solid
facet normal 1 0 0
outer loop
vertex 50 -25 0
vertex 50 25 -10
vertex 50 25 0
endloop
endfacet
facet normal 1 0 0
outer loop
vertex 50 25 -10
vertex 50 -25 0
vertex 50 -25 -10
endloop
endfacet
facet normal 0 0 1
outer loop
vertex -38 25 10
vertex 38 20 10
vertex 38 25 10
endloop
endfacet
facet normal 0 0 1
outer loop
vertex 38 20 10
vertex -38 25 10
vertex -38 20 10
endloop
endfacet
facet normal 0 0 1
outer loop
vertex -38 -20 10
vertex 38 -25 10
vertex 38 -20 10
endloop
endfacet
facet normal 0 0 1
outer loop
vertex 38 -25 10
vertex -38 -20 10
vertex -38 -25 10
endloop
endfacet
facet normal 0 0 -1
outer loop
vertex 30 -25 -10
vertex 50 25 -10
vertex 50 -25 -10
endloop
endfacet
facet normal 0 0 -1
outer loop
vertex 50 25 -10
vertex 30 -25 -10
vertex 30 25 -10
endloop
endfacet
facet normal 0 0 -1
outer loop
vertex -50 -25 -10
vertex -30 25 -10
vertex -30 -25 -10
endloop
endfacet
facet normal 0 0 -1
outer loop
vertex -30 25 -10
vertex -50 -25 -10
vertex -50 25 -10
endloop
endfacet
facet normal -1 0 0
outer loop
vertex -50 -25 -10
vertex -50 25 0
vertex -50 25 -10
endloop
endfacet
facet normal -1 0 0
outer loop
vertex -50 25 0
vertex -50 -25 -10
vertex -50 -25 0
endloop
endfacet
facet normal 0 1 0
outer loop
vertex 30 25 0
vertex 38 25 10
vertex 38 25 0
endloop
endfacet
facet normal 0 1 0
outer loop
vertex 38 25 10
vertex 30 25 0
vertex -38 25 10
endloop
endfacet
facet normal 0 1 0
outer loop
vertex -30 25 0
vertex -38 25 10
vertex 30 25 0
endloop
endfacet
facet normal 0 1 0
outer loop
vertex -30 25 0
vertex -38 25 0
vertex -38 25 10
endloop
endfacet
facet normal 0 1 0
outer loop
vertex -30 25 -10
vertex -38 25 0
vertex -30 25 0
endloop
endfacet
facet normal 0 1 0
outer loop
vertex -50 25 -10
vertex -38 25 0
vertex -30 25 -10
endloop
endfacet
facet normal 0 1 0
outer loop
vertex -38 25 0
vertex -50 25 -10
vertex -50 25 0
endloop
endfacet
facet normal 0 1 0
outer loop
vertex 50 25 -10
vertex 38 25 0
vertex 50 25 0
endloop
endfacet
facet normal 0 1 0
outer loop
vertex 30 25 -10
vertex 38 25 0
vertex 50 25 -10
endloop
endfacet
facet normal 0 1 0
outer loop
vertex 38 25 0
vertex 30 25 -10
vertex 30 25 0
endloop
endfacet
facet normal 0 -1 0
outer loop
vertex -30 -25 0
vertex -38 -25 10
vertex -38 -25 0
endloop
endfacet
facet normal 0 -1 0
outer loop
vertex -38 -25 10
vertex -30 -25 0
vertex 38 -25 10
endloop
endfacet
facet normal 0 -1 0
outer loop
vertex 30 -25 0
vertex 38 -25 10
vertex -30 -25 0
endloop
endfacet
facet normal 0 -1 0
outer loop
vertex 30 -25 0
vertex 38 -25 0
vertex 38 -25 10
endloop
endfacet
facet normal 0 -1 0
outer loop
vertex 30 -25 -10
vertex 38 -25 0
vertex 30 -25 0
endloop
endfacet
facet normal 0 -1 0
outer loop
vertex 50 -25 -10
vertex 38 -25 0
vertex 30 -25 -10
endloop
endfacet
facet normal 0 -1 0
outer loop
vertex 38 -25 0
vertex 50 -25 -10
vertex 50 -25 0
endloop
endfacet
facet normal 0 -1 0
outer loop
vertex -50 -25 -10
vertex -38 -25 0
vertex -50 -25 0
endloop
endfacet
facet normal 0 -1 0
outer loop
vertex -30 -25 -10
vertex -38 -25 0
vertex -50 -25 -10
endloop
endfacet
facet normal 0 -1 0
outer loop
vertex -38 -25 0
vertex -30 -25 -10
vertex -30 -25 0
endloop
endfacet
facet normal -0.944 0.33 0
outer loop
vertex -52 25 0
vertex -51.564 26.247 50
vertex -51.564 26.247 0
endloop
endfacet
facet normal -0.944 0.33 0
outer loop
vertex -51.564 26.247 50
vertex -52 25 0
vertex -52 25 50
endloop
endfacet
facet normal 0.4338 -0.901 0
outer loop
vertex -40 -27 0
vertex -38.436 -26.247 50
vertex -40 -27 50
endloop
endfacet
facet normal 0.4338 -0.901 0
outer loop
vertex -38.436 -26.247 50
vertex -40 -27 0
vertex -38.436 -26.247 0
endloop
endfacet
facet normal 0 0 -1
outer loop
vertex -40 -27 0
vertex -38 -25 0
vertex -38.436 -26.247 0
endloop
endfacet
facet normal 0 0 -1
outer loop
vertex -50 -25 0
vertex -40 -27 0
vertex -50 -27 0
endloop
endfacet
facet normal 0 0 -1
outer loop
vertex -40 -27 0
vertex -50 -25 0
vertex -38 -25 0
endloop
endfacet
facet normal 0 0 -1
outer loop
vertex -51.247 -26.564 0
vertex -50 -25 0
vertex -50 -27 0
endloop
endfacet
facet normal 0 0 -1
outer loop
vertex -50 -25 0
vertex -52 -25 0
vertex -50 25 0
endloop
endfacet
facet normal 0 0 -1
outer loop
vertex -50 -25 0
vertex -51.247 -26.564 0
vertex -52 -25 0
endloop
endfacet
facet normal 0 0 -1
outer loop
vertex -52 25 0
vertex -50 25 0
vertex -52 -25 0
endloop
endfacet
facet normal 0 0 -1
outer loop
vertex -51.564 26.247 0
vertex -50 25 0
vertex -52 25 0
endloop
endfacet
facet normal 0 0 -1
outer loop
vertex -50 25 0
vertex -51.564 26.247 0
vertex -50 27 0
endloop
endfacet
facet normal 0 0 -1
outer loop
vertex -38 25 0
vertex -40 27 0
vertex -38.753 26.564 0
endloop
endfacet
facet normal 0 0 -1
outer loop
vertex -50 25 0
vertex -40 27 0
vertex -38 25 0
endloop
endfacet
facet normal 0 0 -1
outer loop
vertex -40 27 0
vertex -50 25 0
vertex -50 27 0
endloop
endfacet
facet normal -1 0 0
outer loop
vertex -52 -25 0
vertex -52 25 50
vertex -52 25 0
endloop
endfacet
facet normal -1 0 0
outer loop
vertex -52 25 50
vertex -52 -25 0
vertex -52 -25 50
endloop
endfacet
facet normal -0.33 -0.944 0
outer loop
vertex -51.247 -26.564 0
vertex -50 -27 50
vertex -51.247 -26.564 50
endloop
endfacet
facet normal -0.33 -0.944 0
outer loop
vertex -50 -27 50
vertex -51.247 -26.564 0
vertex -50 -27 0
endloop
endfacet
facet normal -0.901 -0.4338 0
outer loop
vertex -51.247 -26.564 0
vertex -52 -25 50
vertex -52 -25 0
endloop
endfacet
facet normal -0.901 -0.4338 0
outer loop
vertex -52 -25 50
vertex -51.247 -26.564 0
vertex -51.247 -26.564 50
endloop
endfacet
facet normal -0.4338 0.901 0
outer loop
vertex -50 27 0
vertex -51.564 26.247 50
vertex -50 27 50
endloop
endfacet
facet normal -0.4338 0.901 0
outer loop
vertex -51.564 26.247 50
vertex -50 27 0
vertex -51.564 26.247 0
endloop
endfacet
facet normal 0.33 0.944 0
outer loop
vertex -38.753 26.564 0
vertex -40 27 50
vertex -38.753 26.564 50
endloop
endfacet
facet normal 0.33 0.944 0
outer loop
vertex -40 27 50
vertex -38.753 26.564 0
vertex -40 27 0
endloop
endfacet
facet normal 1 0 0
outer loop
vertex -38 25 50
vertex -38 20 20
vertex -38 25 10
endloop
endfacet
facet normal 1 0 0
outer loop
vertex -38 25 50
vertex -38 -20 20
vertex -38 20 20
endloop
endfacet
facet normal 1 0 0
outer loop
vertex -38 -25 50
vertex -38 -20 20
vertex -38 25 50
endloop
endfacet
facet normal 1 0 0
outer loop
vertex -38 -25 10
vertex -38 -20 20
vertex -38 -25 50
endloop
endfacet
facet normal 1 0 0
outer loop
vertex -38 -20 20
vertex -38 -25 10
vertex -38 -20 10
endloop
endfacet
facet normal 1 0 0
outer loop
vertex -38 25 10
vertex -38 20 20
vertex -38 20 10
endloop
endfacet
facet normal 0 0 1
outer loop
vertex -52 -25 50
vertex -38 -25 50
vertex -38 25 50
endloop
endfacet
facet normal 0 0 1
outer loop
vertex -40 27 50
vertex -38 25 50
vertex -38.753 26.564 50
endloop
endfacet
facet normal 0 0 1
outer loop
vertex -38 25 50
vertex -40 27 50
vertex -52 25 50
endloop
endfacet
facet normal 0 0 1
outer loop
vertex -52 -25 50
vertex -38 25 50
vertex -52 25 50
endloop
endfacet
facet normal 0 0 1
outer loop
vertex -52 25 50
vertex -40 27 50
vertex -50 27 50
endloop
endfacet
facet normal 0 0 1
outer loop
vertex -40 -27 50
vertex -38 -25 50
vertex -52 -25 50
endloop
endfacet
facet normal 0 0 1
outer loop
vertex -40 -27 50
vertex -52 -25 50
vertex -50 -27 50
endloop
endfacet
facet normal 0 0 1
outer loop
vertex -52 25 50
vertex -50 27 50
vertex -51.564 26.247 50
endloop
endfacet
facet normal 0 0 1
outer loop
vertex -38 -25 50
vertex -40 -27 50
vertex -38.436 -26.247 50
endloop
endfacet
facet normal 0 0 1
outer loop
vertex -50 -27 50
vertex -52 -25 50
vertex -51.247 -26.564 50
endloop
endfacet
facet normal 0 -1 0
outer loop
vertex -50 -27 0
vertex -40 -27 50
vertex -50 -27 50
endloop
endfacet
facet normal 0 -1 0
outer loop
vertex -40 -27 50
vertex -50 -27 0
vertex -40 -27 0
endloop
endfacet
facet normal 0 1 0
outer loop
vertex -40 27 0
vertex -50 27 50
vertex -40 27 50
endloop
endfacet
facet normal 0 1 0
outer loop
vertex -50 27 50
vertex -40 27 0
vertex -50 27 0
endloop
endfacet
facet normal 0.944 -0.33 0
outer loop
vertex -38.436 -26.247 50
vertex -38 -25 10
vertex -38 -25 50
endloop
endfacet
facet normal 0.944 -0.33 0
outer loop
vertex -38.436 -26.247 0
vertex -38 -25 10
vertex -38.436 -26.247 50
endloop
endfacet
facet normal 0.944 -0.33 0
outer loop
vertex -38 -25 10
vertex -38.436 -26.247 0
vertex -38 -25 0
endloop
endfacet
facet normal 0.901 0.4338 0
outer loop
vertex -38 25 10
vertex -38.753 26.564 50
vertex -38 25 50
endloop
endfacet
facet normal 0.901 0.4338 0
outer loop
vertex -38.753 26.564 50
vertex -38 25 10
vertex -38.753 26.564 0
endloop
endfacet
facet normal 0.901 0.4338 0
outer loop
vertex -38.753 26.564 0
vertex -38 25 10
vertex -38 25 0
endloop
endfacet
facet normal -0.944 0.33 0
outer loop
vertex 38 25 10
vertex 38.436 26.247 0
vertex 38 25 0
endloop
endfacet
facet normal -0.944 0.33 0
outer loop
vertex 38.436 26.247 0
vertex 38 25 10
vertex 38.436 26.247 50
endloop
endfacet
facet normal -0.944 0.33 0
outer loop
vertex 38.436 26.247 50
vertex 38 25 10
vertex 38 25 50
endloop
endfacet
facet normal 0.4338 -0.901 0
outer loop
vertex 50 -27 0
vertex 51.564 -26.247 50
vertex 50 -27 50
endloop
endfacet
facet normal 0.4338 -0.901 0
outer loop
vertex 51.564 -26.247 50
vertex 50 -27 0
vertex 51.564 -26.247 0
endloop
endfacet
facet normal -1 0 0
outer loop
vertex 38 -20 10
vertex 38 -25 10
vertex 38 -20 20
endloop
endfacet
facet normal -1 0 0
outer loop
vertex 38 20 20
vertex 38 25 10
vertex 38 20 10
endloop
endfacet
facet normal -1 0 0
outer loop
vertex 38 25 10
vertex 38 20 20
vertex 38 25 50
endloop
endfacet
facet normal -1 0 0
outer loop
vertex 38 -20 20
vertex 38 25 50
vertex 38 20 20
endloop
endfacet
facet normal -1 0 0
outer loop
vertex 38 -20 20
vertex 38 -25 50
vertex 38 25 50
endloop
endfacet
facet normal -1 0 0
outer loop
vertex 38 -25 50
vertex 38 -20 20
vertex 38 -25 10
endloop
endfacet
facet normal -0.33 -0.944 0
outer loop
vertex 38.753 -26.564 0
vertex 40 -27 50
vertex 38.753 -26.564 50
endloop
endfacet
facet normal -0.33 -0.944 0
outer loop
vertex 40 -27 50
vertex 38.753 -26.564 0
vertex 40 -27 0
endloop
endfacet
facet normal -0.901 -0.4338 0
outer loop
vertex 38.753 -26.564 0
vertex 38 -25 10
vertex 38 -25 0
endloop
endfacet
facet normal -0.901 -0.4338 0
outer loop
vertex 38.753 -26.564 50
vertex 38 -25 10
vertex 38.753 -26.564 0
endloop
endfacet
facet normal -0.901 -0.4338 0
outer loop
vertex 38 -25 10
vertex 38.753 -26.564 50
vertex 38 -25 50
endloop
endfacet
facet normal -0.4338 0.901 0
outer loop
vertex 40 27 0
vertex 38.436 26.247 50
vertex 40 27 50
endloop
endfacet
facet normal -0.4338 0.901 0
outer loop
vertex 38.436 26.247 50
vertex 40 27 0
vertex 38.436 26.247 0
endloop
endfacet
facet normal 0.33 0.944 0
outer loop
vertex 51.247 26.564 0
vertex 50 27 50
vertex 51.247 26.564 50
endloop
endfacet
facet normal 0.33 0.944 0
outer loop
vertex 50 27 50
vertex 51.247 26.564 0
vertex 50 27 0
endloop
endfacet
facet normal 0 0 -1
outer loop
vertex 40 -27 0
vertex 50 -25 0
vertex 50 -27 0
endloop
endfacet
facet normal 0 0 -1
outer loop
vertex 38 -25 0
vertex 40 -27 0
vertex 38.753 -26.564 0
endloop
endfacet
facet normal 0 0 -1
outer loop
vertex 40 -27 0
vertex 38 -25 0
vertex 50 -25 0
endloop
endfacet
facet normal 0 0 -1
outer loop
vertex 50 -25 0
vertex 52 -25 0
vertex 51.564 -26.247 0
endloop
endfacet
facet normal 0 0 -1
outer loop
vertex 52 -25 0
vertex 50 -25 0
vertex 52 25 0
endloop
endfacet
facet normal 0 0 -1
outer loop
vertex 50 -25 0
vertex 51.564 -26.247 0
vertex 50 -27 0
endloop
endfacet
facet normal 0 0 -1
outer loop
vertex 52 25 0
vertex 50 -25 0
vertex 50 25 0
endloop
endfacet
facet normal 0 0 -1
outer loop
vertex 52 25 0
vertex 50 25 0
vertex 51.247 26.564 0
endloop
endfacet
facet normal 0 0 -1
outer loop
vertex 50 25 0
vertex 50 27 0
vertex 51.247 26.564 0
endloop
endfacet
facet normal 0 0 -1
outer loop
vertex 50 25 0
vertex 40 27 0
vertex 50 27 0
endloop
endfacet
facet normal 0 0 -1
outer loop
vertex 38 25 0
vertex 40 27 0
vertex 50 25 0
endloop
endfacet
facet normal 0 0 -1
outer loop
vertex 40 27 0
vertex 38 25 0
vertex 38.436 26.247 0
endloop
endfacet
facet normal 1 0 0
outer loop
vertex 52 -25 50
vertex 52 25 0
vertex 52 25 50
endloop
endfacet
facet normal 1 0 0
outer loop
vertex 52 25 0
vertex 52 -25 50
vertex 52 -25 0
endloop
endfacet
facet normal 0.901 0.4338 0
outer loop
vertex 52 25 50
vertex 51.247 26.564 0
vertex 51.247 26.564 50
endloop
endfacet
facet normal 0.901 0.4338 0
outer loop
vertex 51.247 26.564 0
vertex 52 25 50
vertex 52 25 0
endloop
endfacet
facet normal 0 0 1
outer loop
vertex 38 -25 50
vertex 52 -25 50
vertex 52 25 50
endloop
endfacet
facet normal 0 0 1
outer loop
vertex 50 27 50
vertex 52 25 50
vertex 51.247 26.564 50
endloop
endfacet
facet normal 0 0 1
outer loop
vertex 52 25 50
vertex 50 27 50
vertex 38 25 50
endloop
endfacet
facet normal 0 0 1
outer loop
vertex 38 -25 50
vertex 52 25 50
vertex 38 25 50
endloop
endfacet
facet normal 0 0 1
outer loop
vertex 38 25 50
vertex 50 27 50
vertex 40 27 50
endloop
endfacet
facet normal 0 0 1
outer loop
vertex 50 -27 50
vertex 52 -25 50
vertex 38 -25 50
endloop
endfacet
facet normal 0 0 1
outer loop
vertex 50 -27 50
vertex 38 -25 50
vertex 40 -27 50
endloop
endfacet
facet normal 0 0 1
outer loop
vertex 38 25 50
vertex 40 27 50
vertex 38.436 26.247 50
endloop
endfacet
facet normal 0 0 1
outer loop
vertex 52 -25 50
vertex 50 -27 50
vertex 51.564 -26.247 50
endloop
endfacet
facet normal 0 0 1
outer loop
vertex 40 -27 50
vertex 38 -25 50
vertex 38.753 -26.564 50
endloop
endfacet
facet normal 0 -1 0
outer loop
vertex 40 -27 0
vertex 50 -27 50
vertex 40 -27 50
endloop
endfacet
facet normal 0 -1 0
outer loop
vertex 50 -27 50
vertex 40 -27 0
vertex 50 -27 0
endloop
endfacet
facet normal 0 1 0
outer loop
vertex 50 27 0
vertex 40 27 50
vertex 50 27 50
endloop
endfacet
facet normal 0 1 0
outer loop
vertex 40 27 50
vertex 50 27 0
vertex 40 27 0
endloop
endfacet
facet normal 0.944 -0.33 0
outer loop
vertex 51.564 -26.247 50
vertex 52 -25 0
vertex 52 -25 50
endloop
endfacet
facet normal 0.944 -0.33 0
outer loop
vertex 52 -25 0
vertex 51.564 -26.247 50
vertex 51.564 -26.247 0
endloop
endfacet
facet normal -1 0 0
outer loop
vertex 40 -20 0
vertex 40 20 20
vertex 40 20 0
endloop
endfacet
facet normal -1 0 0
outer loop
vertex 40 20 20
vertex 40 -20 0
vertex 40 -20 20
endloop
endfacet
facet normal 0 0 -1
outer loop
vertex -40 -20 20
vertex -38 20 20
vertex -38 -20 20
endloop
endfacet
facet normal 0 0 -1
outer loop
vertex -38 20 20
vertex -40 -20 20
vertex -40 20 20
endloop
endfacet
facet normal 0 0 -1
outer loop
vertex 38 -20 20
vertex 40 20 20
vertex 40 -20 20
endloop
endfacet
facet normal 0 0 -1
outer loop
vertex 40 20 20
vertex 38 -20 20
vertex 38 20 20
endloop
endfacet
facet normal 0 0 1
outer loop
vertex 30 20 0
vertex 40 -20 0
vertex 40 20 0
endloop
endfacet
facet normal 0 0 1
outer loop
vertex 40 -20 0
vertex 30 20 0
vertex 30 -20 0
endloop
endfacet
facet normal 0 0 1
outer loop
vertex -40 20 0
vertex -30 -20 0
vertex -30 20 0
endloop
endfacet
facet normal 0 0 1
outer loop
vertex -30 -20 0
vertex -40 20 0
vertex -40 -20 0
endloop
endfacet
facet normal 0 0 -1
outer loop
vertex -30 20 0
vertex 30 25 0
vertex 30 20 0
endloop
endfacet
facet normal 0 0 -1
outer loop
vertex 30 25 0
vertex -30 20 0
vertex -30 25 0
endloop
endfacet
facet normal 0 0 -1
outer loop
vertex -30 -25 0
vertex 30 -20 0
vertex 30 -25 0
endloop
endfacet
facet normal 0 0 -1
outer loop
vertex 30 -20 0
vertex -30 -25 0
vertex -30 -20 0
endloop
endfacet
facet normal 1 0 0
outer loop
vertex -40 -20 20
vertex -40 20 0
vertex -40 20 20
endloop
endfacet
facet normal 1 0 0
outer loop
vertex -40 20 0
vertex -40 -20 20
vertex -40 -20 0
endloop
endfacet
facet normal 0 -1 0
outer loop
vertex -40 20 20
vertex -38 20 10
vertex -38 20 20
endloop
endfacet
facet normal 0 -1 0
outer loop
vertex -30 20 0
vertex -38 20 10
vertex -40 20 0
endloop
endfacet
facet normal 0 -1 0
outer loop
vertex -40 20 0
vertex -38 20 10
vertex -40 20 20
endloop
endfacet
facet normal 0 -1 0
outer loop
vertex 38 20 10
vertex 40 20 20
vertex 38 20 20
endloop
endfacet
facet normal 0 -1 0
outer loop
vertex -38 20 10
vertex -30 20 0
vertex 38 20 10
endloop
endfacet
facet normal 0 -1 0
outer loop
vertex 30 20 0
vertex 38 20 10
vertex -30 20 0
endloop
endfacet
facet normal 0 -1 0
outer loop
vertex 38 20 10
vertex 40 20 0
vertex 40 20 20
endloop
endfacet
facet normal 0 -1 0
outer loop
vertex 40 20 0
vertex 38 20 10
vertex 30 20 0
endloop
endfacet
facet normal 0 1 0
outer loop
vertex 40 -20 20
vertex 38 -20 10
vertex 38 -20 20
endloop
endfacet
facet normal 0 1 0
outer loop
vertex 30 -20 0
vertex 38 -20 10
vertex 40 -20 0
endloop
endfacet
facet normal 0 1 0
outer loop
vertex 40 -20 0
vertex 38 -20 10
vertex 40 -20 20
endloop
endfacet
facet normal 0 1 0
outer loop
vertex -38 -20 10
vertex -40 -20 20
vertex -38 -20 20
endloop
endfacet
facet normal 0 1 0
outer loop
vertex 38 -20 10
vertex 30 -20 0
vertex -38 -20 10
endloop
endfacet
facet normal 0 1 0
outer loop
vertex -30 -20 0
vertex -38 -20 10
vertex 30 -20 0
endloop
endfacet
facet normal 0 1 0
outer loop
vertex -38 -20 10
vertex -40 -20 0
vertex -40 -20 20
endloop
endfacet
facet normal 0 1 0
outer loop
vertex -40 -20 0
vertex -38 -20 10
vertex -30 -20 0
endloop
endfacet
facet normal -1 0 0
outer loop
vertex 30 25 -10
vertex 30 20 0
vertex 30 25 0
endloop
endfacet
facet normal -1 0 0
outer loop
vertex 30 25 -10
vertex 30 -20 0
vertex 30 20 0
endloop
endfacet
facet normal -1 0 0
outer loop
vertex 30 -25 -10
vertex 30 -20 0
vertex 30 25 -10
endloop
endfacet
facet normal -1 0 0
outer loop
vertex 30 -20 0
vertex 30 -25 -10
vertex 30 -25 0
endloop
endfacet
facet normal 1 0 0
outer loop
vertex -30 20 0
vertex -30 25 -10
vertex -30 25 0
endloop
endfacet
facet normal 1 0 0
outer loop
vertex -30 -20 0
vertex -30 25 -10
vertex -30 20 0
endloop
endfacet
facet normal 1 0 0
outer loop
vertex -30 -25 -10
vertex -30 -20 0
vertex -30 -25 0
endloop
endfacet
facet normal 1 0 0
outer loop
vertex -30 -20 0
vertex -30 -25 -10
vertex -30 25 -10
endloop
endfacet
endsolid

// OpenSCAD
module u_channel() {
    difference() {
        // Main block
        union() {
            // Base block
            cube([100, 50, 20], center=true);
            // Side walls
            translate([-50, -25, 0])
                linear_extrude(height=50)
                offset(r=2)
                polygon(points=[[0,0], [0,50], [10,50], [10,0]]);
            translate([40, -25, 0])
                linear_extrude(height=50)
                offset(r=2)
                polygon(points=[[0,0], [0,50], [10,50], [10,0]]);
        }
        // Central pocket
        translate([-40, -20, 0])
            cube([80, 40, 20], center=false);
        // Bottom notch
        translate([-30, -25, -10])
            cube([60, 50, 10], center=false);
    }
}

u_channel();
